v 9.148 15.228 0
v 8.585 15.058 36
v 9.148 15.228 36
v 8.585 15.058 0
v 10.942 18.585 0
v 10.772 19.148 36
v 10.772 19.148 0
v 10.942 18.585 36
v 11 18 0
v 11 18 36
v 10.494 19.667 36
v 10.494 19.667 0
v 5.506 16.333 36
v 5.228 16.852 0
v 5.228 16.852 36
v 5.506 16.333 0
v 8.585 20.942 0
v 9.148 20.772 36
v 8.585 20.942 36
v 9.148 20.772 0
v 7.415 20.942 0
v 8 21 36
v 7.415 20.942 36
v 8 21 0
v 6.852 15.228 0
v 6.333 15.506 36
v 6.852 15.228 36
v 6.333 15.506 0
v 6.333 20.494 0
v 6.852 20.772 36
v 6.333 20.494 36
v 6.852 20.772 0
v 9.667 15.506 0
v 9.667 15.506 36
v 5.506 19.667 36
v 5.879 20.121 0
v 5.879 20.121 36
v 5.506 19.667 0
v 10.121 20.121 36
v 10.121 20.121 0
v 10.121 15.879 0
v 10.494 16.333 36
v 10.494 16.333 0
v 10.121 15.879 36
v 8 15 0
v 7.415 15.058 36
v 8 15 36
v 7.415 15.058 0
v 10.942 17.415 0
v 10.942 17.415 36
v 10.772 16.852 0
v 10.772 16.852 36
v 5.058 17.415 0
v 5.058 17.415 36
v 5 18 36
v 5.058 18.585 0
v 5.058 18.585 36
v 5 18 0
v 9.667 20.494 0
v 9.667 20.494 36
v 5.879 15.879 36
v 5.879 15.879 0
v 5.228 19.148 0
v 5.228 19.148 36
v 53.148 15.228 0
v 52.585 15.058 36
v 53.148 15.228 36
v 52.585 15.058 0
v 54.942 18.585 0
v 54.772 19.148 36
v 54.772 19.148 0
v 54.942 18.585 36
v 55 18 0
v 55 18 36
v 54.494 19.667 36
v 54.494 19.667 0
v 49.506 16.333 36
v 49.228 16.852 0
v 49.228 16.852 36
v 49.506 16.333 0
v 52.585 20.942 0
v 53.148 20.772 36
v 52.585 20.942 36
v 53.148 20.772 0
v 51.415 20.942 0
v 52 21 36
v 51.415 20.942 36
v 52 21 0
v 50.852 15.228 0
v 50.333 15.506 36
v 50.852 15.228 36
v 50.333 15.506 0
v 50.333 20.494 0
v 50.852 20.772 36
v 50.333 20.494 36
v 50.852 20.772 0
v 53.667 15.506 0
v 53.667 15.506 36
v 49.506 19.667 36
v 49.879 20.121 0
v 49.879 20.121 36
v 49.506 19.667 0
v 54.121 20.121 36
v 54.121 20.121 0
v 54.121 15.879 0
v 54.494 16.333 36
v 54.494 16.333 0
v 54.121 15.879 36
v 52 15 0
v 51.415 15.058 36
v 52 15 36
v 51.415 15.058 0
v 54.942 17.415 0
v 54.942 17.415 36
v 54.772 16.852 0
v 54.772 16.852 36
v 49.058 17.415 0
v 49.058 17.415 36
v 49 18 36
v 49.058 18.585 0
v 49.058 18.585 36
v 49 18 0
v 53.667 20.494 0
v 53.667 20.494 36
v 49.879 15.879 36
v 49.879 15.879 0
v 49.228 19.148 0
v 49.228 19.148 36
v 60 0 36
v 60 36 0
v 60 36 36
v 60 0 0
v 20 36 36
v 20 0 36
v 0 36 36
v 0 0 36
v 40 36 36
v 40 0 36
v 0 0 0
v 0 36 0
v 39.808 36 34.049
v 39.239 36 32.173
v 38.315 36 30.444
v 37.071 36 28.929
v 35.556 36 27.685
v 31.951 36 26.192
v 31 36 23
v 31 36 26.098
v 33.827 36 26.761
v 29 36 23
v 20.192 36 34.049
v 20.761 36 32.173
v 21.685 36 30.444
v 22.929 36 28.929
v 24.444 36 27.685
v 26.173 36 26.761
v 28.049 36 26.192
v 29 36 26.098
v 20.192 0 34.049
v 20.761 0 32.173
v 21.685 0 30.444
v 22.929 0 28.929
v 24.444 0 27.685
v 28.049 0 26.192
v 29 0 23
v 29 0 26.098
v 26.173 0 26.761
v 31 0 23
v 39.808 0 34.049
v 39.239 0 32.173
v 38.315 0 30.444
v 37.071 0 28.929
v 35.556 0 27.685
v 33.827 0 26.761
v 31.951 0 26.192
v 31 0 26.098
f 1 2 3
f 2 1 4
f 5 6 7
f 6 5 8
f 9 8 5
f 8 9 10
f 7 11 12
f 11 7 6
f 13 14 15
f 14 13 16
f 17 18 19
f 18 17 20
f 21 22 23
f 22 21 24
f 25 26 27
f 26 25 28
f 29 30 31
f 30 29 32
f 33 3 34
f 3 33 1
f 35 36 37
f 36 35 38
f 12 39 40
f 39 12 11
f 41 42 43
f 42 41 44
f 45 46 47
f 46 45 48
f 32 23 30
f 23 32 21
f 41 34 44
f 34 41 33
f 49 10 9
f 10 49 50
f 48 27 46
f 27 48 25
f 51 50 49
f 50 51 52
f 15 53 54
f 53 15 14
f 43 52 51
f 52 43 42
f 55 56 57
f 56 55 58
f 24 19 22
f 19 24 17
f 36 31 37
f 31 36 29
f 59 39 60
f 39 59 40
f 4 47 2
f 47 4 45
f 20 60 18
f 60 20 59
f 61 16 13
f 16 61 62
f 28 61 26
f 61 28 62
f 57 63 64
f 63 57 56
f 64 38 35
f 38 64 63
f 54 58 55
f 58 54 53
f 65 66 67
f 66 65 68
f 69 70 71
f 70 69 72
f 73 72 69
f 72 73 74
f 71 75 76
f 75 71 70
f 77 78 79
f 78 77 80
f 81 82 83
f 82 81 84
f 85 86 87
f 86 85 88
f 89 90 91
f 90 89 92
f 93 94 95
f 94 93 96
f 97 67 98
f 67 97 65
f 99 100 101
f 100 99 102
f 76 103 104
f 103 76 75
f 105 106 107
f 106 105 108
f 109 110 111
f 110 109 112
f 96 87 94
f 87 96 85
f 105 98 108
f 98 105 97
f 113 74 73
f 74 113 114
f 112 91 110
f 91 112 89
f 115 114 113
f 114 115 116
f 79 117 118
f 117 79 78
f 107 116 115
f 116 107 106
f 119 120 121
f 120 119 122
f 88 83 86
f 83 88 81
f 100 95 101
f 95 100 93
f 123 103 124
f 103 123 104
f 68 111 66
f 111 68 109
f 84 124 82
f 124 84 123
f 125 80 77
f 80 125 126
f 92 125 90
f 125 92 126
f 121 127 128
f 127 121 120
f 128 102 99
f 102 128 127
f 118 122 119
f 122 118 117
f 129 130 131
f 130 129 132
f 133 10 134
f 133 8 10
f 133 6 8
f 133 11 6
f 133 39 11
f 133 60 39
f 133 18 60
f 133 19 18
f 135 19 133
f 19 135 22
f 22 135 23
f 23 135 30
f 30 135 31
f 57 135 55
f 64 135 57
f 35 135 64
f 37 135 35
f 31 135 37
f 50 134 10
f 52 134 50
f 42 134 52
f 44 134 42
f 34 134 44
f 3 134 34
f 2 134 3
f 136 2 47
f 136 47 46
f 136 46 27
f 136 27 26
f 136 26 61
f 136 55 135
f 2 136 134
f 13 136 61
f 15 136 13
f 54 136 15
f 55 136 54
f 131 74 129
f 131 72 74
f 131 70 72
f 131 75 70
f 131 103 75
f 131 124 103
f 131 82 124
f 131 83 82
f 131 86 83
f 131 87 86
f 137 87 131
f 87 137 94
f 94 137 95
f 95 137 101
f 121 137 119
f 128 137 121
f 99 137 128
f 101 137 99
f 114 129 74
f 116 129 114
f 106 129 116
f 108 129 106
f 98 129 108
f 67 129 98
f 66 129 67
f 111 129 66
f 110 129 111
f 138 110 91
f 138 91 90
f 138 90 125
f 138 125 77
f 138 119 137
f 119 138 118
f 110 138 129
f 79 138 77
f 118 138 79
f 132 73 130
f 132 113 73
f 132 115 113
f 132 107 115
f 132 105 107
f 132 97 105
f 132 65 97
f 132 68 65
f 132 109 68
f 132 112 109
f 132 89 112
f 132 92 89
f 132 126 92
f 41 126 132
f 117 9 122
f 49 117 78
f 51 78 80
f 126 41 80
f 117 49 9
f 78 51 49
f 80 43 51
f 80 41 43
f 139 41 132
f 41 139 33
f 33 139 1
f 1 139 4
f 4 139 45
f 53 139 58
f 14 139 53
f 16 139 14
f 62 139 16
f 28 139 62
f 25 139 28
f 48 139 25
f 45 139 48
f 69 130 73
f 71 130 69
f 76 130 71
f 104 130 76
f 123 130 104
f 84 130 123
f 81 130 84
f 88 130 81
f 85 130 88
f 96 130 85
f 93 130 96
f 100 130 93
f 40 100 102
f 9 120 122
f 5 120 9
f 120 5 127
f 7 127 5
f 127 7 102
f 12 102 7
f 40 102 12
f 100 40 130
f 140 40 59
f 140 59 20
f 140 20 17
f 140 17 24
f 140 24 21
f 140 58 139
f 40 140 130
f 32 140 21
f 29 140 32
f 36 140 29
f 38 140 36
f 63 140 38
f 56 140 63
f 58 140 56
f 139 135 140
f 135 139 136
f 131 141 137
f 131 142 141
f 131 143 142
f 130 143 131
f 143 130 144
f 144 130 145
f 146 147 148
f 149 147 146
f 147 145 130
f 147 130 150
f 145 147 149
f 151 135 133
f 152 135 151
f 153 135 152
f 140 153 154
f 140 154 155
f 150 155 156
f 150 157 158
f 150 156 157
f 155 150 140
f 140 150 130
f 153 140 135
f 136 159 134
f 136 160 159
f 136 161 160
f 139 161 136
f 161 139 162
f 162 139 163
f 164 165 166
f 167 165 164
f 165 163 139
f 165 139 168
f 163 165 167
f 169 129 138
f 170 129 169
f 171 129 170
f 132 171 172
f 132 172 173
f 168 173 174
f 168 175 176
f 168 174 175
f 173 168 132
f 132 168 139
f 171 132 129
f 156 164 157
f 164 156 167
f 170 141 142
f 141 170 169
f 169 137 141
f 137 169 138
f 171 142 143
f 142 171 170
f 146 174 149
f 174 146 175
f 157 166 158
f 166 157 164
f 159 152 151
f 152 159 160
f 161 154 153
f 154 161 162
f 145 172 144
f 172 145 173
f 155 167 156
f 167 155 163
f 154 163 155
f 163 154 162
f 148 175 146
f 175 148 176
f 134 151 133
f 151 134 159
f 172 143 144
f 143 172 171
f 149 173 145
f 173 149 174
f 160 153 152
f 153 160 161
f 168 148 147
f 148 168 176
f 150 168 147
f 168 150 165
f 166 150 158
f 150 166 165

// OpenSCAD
$fn = 32;

// ----------------------------------------------------------------------
// Saddle clamp: split shaft clamp
// ----------------------------------------------------------------------

// --- parameters (mm) ---
blk_l = 60;               // block length, X
blk_w = 36;               // block width, Y
blk_h = 36;               // block height
clamp_r = 10;             // shaft groove radius
hole_r = 3;               // bolt hole radius
hole_m = 8;               // bolt hole margin from the ends
saw_w = 2;                // saw kerf width

saw_depth = clamp_r + 3;  // saw kerf depth

difference() {
  cube([blk_l, blk_w, blk_h]);
  translate([blk_l / 2, -1, blk_h])
    rotate([-90, 0, 0])
      cylinder(h = blk_w + 2, r = clamp_r);
  for (sx = [0, 1])
    translate([sx ? blk_l - hole_m : hole_m, blk_w / 2, -1])
      cylinder(r = hole_r, h = blk_h + 2);
  translate([blk_l / 2 - saw_w / 2, -1, blk_h - saw_depth])
    cube([saw_w, blk_w + 2, saw_depth + 1]);
}
